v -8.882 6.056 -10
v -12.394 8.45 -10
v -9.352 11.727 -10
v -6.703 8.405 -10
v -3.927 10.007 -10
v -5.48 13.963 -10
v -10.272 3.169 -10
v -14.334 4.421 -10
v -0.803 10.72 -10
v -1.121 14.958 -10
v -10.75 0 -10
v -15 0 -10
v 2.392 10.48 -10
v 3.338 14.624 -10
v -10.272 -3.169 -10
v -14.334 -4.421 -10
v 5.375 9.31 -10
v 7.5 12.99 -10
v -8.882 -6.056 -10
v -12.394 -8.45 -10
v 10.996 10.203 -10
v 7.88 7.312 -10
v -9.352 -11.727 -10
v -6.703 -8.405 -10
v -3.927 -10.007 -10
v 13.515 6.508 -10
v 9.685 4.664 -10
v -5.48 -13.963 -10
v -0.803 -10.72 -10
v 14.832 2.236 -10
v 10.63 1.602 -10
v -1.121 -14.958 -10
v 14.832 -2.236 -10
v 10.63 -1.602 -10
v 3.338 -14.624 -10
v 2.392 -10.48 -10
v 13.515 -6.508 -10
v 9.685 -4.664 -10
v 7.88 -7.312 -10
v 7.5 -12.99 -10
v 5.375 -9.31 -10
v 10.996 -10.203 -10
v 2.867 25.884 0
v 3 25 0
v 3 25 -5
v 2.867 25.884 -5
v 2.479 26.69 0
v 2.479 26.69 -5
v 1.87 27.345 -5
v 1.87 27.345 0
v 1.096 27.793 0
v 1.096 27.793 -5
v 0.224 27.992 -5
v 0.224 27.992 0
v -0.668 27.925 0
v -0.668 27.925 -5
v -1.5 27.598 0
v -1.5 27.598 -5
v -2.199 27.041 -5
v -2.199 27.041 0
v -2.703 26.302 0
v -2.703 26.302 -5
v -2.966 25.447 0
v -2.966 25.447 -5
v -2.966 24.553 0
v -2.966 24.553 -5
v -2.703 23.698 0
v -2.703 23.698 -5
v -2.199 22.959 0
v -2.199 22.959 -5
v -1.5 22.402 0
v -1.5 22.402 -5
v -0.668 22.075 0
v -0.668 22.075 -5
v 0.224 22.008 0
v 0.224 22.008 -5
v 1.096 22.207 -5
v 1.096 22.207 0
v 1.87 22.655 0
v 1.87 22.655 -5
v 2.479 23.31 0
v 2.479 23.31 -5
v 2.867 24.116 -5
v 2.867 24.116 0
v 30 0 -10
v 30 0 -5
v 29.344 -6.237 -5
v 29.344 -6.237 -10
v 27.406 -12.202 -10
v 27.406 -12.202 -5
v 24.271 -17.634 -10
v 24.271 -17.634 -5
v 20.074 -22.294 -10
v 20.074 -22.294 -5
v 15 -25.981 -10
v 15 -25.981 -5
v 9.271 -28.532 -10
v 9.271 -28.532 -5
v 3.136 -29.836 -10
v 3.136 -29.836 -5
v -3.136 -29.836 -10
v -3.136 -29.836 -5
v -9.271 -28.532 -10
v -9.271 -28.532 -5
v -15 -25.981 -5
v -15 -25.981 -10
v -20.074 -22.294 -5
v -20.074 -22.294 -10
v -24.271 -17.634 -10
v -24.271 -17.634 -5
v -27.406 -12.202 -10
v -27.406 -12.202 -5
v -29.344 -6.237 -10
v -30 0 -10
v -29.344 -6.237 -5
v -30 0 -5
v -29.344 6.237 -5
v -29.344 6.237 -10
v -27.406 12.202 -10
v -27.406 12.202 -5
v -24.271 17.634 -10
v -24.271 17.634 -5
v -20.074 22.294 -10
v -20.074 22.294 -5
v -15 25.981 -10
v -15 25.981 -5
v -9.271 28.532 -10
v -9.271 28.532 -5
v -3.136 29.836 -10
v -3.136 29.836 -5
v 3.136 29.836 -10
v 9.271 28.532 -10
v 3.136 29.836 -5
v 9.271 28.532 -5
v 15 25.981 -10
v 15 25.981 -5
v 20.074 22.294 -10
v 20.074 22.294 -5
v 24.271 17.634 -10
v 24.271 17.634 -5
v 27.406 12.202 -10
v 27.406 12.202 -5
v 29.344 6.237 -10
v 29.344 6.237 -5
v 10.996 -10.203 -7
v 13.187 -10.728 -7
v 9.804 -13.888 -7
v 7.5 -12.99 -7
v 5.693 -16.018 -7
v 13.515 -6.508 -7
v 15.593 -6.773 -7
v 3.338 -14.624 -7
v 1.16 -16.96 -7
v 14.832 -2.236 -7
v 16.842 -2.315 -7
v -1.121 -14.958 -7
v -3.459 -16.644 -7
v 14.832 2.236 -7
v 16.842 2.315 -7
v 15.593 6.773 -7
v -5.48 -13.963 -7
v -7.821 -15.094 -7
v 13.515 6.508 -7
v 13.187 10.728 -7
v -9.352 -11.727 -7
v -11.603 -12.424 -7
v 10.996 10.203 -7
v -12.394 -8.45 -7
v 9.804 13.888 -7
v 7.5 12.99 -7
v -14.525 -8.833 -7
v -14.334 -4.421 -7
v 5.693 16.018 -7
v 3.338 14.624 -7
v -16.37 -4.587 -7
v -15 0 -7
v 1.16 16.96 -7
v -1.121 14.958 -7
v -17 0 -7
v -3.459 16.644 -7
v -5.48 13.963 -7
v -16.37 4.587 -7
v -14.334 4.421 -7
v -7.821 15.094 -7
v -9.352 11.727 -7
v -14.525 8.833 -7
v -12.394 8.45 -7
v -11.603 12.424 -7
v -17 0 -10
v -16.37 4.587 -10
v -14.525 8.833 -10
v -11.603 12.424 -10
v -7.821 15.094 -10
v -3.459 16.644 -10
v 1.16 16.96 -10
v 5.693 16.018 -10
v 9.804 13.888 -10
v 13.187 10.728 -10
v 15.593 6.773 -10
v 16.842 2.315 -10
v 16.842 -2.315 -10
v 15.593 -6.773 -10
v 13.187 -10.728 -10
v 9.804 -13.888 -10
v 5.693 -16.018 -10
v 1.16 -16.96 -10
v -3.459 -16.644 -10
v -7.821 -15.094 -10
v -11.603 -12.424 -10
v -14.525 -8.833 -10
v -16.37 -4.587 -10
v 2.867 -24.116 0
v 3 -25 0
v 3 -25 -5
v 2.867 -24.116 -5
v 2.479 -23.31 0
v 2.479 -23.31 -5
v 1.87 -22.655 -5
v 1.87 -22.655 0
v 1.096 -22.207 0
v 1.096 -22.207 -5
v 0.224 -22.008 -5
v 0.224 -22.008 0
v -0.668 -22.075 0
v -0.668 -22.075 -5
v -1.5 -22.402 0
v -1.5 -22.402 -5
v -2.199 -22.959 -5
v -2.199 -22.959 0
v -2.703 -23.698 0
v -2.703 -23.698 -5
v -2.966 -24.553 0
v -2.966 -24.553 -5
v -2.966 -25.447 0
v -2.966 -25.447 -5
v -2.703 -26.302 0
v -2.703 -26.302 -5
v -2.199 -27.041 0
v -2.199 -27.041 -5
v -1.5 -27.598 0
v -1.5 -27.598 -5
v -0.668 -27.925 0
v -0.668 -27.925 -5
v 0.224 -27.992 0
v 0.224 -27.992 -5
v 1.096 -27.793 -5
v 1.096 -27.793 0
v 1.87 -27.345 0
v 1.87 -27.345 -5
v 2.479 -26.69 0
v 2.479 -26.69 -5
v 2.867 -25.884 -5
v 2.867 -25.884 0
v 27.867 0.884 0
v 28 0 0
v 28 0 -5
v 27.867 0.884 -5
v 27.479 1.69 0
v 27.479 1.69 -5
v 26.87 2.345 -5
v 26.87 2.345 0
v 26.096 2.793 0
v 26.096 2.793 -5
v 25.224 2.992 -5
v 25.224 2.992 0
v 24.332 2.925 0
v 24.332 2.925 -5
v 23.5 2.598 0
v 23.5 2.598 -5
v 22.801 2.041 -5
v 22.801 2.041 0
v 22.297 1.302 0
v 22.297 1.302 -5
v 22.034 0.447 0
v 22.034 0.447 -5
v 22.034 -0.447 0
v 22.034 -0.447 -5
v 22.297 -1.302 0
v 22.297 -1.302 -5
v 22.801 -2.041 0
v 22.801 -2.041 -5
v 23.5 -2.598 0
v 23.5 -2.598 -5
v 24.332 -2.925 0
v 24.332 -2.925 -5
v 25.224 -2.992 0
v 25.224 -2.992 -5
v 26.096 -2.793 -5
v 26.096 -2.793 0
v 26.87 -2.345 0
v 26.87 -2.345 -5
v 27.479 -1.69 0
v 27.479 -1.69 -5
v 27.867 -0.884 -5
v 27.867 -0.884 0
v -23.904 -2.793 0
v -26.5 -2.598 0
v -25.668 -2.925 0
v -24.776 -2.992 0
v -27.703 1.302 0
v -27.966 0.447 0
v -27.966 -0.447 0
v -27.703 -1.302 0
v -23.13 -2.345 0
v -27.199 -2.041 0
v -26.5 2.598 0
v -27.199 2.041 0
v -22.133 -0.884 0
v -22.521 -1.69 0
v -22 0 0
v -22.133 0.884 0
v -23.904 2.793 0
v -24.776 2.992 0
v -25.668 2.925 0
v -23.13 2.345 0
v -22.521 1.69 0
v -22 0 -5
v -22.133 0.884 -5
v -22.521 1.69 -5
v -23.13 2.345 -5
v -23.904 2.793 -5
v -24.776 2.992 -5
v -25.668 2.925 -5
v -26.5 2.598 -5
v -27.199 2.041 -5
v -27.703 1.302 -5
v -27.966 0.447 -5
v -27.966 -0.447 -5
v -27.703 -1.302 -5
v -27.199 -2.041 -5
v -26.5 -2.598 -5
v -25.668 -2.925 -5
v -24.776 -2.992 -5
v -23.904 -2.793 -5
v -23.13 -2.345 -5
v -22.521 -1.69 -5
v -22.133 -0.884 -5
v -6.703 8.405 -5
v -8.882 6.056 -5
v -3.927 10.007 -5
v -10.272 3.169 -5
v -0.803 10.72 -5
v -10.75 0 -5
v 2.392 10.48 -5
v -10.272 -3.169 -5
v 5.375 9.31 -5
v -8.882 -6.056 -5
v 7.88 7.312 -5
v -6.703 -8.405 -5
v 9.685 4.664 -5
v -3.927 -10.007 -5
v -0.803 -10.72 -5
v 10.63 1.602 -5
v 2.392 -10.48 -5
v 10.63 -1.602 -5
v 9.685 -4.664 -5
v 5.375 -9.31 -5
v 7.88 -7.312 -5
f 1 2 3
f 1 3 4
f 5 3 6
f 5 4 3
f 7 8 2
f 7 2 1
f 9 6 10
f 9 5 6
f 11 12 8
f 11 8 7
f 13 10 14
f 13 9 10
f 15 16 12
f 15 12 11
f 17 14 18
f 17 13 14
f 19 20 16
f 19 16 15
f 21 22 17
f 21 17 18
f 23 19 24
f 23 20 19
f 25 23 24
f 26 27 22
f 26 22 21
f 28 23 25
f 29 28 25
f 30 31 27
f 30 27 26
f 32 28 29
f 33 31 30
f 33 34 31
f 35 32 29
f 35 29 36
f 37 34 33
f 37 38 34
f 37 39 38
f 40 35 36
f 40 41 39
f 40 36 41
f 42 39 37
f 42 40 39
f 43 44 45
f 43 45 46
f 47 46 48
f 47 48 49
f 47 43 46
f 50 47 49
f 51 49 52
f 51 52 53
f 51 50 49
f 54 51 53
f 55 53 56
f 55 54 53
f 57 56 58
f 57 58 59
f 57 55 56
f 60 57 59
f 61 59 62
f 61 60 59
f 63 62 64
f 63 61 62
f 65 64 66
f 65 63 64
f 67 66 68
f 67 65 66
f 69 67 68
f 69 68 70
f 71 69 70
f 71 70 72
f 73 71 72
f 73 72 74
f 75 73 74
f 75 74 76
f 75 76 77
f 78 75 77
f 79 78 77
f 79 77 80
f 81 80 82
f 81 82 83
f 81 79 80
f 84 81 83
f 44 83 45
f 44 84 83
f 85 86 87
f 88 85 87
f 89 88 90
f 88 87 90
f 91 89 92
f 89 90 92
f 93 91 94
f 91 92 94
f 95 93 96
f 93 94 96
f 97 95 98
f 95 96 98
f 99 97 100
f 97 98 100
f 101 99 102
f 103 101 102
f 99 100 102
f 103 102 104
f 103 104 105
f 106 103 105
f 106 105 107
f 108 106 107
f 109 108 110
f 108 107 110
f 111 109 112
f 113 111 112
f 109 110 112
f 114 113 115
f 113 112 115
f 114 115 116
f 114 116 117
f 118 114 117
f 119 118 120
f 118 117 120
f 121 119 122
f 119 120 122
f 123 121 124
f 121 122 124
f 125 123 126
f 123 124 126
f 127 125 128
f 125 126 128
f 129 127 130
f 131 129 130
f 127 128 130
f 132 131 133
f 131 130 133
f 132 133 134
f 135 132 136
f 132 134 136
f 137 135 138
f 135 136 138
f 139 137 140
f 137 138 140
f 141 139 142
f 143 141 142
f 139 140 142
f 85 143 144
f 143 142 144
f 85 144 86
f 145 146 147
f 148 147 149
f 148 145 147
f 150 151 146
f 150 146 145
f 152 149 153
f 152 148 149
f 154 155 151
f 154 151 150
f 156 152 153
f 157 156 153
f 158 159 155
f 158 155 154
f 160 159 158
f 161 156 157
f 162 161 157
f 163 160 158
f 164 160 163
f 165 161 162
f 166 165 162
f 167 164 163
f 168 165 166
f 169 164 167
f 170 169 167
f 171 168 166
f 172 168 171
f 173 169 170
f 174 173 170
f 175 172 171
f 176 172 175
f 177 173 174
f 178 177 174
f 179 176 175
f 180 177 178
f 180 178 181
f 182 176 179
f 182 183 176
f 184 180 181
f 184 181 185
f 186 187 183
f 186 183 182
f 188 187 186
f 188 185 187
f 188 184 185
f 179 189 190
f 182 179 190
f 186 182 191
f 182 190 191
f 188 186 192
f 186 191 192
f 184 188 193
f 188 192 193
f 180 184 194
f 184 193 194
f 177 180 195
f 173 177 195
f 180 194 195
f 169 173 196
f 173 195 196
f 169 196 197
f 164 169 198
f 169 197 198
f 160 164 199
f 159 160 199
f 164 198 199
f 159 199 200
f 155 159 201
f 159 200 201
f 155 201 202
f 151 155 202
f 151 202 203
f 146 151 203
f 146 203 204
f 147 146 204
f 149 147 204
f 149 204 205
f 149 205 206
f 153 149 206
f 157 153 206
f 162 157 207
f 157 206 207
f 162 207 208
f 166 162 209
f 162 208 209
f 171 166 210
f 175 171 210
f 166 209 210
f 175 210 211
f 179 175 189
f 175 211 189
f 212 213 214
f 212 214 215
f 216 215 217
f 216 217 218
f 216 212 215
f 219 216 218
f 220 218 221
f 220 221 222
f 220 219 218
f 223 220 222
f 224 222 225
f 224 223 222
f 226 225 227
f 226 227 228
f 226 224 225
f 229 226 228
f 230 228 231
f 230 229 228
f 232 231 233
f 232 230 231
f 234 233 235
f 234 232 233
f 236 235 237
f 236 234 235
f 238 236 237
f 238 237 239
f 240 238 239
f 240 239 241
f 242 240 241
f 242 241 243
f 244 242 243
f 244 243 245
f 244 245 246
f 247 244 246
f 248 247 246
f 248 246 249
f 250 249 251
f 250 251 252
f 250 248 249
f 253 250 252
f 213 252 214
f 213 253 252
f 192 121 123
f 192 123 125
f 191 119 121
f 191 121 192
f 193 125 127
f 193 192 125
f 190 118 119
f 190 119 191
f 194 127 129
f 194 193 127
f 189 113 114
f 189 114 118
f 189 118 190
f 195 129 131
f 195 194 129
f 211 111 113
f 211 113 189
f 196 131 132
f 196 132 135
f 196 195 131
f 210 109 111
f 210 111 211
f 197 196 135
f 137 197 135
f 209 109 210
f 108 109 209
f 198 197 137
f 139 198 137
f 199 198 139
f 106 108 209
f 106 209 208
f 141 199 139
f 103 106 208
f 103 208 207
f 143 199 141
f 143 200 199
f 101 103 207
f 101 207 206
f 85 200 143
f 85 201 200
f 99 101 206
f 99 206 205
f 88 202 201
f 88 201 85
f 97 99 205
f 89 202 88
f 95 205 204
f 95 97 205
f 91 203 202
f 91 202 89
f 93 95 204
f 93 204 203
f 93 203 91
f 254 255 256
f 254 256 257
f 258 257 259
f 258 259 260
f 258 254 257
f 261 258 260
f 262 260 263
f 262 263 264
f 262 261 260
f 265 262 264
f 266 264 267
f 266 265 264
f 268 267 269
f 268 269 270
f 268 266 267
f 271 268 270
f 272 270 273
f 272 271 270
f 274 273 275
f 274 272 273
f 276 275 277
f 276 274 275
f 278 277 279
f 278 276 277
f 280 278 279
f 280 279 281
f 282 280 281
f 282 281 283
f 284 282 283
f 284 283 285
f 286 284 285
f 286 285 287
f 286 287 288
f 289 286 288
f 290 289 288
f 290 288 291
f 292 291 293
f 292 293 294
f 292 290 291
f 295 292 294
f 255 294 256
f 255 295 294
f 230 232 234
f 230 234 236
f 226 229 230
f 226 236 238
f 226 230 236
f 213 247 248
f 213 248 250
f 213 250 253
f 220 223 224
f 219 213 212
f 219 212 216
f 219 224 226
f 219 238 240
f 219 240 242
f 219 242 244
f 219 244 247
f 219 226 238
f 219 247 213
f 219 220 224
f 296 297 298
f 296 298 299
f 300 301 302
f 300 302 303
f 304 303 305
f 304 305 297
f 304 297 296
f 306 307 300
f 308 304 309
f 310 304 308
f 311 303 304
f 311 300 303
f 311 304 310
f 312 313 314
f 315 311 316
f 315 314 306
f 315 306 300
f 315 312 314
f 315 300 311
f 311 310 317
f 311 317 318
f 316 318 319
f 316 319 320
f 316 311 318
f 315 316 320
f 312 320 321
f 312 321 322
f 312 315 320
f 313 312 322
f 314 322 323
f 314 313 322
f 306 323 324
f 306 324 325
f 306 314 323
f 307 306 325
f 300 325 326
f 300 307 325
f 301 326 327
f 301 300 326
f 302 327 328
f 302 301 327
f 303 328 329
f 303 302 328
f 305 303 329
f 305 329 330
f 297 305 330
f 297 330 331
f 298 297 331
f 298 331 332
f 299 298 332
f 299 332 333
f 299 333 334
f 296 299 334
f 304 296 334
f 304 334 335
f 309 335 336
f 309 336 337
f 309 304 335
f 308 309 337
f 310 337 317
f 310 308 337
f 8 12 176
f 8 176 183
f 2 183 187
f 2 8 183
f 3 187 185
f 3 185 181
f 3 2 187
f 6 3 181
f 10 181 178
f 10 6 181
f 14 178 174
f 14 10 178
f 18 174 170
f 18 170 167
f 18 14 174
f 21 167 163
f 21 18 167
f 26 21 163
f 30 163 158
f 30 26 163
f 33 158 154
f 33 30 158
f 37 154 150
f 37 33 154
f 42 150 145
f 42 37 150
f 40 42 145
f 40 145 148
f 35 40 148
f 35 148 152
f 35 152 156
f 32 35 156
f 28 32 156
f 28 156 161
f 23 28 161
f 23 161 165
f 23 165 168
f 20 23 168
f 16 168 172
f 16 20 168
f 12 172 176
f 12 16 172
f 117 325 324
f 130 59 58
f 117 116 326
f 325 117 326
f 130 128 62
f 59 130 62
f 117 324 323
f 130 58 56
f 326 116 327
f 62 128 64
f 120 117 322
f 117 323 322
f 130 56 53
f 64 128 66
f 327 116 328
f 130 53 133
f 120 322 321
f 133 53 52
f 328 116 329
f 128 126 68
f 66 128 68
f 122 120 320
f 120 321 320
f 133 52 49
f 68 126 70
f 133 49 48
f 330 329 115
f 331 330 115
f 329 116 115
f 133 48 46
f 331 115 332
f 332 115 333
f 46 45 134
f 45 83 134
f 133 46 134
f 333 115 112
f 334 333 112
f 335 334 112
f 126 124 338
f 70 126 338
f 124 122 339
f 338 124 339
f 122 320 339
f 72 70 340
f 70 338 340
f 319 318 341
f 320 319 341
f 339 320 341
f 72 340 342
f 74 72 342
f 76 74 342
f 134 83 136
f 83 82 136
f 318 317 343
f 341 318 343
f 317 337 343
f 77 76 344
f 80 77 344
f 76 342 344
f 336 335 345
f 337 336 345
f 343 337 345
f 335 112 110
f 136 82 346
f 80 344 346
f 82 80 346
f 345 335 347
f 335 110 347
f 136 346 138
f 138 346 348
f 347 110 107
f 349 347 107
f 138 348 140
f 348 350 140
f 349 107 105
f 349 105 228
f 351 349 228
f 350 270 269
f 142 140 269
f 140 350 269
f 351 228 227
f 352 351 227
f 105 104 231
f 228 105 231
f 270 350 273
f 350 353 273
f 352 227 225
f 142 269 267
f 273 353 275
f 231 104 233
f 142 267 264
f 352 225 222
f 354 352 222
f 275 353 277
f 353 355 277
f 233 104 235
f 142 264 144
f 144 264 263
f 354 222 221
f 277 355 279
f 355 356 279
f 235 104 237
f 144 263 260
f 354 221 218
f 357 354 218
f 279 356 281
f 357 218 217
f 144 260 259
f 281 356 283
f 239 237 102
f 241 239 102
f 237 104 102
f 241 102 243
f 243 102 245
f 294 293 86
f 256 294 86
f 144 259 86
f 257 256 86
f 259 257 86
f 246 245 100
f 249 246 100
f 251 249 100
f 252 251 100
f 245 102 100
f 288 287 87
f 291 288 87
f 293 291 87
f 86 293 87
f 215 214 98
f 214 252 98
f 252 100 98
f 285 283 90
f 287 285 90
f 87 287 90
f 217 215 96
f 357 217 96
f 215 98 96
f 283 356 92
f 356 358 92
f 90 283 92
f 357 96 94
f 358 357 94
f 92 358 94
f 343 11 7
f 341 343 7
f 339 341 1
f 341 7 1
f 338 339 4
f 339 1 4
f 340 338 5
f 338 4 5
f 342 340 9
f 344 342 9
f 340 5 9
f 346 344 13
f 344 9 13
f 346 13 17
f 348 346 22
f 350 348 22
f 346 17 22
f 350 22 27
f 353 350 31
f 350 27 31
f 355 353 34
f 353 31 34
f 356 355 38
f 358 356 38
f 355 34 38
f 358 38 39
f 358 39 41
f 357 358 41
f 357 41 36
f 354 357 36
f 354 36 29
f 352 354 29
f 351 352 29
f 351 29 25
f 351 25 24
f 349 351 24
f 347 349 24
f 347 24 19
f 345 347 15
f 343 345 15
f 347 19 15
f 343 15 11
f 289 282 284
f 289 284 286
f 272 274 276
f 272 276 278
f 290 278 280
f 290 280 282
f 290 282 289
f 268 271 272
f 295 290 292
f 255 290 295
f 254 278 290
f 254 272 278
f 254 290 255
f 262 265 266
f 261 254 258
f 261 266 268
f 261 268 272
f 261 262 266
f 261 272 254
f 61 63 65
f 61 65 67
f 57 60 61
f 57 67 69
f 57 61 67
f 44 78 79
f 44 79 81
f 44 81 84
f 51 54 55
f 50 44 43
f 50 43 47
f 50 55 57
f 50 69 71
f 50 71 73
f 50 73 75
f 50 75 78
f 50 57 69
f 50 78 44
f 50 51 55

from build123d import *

# Parameters (mm, degrees)
SKETCH_1_R          = 3
EXTRUDE_1_DEPTH     = 5
EXTRUDE_1_2_DEPTH   = 5
EXTRUDE_1_3_DEPTH   = 5
EXTRUDE_1_4_DEPTH   = 5
SKETCH_2_R          = 30
EXTRUDE_2_DEPTH     = 5
SKETCH_3_R          = 10.75
CUT_EXTRUDE_1_DEPTH = 5
SKETCH_4_R          = 17
SKETCH_4_R_2        = 15
CUT_EXTRUDE_3_DEPTH = 3


with BuildPart() as part:
    # 草图1 → 凸台-拉伸1 (new body)
    with BuildSketch(Plane.XY):
        with Locations((25, 0)):
            Circle(SKETCH_1_R)
    extrude(amount=-EXTRUDE_1_DEPTH)



with BuildPart() as body_2:
    # 草图1 → Extrude 1 2 (new body)
    with BuildSketch(Plane.XY):
        with Locations((0, -25)):
            Circle(SKETCH_1_R)
    extrude(amount=-EXTRUDE_1_2_DEPTH)


with BuildPart() as body_3:
    # 草图1 → Extrude 1 3 (new body)
    with BuildSketch(Plane.XY):
        with Locations((-25, 0)):
            Circle(SKETCH_1_R)
    extrude(amount=-EXTRUDE_1_3_DEPTH)


with BuildPart() as body_4:
    # 草图1 → Extrude 1 4 (new body)
    with BuildSketch(Plane.XY):
        with Locations((0, 25)):
            Circle(SKETCH_1_R)
    extrude(amount=-EXTRUDE_1_4_DEPTH)


with BuildPart() as part_1:
    add(part.part)

    add(body_2.part)  # 凸台-拉伸2 merges body 2

    add(body_3.part)  # 凸台-拉伸2 merges body 3

    add(body_4.part)  # 凸台-拉伸2 merges body 4
    # 草图2 → 凸台-拉伸2 (add)
    with BuildSketch(Plane(origin=(0, 0, -5), x_dir=(-1, 0, 0), z_dir=(0, 0, -1))):
        with Locations(Location((0, 0, 0), (0, 0, 180))):
            Circle(SKETCH_2_R)
    extrude(amount=EXTRUDE_2_DEPTH)

    # 草图3 → 切除-拉伸1 (cut)
    with BuildSketch(Plane(origin=(0, 0, -10), x_dir=(-1, 0, 0), z_dir=(0, 0, -1))):
        Circle(SKETCH_3_R)
    extrude(amount=-CUT_EXTRUDE_1_DEPTH, mode=Mode.SUBTRACT)

    # 草图4 → 切除-拉伸3 (cut)
    with BuildSketch(Plane(origin=(0, 0, -10), x_dir=(-1, 0, 0), z_dir=(0, 0, -1))):
        Circle(SKETCH_4_R)
        Circle(SKETCH_4_R_2, mode=Mode.SUBTRACT)
    extrude(amount=-CUT_EXTRUDE_3_DEPTH, mode=Mode.SUBTRACT)


solid = part_1.part
